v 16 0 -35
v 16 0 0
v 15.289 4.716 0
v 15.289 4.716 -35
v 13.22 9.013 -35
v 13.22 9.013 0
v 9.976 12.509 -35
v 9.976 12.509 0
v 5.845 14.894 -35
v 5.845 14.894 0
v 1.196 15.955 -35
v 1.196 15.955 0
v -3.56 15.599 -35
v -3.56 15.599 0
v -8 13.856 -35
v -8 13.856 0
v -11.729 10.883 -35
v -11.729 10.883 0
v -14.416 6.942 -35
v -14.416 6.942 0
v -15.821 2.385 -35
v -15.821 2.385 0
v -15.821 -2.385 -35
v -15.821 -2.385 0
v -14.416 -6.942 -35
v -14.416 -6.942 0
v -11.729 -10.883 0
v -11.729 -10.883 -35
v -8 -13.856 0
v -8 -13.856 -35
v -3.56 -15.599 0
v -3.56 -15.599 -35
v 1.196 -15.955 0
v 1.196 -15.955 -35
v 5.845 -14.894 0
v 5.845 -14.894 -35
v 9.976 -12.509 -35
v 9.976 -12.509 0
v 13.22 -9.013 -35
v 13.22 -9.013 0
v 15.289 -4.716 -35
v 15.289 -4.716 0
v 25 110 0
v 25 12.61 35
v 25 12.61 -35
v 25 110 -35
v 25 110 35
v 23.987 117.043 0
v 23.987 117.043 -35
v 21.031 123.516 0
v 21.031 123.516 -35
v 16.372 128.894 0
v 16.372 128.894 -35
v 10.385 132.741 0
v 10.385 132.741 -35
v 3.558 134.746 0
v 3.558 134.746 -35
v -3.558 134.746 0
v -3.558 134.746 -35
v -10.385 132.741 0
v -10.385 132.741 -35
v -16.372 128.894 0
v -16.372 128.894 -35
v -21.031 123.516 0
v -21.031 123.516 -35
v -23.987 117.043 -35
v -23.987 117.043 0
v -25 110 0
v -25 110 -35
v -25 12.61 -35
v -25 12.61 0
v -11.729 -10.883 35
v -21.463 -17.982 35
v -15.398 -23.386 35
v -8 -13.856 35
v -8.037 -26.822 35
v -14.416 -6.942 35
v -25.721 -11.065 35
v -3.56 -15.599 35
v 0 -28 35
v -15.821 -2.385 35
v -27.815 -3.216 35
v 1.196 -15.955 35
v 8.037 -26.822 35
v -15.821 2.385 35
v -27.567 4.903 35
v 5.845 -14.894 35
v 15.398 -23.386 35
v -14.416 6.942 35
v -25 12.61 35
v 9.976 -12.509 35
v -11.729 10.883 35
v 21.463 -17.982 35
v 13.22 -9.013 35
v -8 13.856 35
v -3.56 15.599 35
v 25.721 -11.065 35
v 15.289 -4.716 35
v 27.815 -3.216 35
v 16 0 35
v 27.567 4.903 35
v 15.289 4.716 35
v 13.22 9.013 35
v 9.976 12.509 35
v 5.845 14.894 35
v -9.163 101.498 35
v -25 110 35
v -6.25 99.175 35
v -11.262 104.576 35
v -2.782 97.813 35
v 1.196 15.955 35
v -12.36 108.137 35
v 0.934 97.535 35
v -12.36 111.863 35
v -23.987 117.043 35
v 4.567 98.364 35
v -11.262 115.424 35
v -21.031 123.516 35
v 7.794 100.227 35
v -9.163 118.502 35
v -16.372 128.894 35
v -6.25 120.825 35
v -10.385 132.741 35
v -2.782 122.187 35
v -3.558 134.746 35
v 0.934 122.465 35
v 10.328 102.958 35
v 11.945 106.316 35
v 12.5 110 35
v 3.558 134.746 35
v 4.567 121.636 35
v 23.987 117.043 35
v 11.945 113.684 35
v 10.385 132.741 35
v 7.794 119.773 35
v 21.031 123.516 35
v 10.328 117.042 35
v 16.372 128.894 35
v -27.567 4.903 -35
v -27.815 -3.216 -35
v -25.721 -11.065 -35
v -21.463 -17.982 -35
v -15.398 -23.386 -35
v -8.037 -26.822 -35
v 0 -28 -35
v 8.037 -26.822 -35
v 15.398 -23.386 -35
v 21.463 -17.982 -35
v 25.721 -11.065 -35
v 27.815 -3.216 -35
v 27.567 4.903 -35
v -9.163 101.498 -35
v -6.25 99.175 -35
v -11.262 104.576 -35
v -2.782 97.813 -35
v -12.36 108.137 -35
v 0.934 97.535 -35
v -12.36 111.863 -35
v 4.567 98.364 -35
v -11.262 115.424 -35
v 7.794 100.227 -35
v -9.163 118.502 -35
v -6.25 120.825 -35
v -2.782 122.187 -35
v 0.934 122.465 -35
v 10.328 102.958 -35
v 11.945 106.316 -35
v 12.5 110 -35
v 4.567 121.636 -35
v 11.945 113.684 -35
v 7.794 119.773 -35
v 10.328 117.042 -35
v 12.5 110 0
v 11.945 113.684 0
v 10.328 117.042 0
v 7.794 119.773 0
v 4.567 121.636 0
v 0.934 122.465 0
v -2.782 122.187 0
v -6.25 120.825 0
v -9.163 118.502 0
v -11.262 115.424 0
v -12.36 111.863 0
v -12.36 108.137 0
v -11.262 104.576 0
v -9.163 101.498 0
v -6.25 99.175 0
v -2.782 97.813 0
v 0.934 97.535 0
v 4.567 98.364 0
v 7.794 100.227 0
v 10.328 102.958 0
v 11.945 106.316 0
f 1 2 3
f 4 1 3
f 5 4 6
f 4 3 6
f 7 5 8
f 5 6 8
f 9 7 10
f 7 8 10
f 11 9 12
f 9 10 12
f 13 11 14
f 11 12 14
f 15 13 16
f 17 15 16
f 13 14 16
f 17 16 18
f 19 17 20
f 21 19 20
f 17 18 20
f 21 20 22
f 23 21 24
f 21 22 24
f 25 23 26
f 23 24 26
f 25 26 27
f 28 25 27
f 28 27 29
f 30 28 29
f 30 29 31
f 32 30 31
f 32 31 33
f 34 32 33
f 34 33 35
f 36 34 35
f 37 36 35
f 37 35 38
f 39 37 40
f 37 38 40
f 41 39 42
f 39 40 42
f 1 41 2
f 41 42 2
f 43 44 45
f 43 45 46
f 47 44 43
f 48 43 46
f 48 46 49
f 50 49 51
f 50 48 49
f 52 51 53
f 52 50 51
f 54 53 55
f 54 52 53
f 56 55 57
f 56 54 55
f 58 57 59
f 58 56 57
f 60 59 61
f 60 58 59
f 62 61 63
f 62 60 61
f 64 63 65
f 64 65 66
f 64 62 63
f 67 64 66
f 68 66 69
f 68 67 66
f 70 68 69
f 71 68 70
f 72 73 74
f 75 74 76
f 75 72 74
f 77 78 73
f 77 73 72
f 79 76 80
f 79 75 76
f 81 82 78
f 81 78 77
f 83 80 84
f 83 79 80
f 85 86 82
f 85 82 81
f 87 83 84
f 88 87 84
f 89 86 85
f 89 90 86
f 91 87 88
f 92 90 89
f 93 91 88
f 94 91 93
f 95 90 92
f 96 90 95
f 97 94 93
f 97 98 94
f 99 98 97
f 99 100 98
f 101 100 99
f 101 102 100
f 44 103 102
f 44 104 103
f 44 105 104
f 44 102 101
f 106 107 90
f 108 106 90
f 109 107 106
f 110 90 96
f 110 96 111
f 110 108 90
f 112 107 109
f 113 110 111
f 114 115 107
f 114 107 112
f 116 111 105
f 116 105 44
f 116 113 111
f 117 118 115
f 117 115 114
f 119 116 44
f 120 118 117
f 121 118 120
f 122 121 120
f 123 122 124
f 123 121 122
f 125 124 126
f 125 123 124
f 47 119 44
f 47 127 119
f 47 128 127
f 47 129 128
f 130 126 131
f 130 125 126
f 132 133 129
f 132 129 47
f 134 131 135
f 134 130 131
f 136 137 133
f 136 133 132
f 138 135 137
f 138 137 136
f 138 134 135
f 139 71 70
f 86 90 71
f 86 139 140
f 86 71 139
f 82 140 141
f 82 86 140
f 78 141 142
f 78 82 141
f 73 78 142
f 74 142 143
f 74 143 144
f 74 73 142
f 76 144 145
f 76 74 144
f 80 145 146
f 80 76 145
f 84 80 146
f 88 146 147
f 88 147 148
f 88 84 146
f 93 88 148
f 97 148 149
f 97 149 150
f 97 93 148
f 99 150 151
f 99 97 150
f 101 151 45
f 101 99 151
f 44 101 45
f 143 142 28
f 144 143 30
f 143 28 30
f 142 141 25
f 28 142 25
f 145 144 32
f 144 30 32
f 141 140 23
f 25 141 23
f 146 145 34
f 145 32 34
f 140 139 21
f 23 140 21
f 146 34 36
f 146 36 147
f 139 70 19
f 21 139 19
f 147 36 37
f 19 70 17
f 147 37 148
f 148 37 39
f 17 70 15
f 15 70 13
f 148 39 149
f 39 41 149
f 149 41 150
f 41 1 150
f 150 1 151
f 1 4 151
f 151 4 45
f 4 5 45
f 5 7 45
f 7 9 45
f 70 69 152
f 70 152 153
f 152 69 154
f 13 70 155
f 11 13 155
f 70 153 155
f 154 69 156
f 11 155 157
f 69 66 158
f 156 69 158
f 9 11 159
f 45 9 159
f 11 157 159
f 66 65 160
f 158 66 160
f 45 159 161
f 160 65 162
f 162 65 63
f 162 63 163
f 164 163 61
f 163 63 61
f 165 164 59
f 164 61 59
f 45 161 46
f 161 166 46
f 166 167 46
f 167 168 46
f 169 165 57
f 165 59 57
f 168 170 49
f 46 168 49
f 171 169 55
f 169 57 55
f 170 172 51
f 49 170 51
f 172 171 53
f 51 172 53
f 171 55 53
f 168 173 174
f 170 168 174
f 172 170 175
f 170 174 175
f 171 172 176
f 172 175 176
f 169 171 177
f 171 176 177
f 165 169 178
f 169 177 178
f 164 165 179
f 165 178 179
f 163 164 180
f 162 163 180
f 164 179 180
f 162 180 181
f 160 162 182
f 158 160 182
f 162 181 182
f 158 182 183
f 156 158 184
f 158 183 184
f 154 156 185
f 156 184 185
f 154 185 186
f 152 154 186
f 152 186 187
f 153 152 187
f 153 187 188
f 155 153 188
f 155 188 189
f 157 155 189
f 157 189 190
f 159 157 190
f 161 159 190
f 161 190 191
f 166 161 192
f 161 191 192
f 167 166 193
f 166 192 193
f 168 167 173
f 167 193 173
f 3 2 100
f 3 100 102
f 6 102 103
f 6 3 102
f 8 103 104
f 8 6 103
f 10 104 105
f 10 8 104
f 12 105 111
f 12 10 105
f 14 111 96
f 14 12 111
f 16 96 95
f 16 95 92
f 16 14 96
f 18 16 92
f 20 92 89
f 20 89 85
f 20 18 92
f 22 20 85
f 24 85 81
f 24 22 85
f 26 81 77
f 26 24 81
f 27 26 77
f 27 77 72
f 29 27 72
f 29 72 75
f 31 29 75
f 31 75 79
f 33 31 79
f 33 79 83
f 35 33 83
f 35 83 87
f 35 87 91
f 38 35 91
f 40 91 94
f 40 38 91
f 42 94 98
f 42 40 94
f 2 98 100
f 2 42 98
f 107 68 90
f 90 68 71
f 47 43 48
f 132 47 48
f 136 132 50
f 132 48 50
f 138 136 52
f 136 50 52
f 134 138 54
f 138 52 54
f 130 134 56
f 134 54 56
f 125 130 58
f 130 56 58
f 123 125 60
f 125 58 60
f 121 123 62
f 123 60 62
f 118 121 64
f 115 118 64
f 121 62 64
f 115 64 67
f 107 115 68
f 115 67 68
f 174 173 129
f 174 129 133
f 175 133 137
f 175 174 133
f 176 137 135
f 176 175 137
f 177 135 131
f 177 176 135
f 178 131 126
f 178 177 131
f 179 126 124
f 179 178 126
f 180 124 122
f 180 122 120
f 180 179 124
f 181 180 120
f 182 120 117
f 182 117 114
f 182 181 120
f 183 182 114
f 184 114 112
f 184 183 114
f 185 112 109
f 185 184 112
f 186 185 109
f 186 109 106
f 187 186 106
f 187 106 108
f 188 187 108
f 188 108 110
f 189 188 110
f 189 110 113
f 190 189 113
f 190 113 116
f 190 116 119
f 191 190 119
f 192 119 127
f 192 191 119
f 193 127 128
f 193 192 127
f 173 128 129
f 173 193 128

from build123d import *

# Parameters (mm, degrees)
SKETCH1_R           = 25
SKETCH1_R_2         = 12.5
SKETCH1_R_3         = 28
SKETCH1_R_4         = 16
BOSS_EXTRUDE1_DEPTH = 35


with BuildPart() as part:
    # Sketch1 → Boss-Extrude1 (new, symmetric)
    # profile 1 of 3: a face of its own
    with BuildSketch(Plane.XY):
        with BuildLine():
            ThreePointArc((-25, 12.609520213), (0, 28), (25, 12.609520213))
            Line((25, 12.609520213), (25, 110))
            ThreePointArc((25, 110), (0, 85), (-25, 110))
            Line((-25, 110), (-25, 92))
            Line((-25, 92), (-25, 12.609520213))
        make_face()
    # profile 2 of 3: a face of its own
    with BuildSketch(Plane.XY):
        with Locations((0, 110)):
            Circle(SKETCH1_R)
        with Locations((0, 110)):
            Circle(SKETCH1_R_2, mode=Mode.SUBTRACT)
    # profile 3 of 3: a face of its own
    with BuildSketch(Plane.XY):
        Circle(SKETCH1_R_3)
        Circle(SKETCH1_R_4, mode=Mode.SUBTRACT)
    extrude(amount=BOSS_EXTRUDE1_DEPTH, both=True)


solid = part.part
